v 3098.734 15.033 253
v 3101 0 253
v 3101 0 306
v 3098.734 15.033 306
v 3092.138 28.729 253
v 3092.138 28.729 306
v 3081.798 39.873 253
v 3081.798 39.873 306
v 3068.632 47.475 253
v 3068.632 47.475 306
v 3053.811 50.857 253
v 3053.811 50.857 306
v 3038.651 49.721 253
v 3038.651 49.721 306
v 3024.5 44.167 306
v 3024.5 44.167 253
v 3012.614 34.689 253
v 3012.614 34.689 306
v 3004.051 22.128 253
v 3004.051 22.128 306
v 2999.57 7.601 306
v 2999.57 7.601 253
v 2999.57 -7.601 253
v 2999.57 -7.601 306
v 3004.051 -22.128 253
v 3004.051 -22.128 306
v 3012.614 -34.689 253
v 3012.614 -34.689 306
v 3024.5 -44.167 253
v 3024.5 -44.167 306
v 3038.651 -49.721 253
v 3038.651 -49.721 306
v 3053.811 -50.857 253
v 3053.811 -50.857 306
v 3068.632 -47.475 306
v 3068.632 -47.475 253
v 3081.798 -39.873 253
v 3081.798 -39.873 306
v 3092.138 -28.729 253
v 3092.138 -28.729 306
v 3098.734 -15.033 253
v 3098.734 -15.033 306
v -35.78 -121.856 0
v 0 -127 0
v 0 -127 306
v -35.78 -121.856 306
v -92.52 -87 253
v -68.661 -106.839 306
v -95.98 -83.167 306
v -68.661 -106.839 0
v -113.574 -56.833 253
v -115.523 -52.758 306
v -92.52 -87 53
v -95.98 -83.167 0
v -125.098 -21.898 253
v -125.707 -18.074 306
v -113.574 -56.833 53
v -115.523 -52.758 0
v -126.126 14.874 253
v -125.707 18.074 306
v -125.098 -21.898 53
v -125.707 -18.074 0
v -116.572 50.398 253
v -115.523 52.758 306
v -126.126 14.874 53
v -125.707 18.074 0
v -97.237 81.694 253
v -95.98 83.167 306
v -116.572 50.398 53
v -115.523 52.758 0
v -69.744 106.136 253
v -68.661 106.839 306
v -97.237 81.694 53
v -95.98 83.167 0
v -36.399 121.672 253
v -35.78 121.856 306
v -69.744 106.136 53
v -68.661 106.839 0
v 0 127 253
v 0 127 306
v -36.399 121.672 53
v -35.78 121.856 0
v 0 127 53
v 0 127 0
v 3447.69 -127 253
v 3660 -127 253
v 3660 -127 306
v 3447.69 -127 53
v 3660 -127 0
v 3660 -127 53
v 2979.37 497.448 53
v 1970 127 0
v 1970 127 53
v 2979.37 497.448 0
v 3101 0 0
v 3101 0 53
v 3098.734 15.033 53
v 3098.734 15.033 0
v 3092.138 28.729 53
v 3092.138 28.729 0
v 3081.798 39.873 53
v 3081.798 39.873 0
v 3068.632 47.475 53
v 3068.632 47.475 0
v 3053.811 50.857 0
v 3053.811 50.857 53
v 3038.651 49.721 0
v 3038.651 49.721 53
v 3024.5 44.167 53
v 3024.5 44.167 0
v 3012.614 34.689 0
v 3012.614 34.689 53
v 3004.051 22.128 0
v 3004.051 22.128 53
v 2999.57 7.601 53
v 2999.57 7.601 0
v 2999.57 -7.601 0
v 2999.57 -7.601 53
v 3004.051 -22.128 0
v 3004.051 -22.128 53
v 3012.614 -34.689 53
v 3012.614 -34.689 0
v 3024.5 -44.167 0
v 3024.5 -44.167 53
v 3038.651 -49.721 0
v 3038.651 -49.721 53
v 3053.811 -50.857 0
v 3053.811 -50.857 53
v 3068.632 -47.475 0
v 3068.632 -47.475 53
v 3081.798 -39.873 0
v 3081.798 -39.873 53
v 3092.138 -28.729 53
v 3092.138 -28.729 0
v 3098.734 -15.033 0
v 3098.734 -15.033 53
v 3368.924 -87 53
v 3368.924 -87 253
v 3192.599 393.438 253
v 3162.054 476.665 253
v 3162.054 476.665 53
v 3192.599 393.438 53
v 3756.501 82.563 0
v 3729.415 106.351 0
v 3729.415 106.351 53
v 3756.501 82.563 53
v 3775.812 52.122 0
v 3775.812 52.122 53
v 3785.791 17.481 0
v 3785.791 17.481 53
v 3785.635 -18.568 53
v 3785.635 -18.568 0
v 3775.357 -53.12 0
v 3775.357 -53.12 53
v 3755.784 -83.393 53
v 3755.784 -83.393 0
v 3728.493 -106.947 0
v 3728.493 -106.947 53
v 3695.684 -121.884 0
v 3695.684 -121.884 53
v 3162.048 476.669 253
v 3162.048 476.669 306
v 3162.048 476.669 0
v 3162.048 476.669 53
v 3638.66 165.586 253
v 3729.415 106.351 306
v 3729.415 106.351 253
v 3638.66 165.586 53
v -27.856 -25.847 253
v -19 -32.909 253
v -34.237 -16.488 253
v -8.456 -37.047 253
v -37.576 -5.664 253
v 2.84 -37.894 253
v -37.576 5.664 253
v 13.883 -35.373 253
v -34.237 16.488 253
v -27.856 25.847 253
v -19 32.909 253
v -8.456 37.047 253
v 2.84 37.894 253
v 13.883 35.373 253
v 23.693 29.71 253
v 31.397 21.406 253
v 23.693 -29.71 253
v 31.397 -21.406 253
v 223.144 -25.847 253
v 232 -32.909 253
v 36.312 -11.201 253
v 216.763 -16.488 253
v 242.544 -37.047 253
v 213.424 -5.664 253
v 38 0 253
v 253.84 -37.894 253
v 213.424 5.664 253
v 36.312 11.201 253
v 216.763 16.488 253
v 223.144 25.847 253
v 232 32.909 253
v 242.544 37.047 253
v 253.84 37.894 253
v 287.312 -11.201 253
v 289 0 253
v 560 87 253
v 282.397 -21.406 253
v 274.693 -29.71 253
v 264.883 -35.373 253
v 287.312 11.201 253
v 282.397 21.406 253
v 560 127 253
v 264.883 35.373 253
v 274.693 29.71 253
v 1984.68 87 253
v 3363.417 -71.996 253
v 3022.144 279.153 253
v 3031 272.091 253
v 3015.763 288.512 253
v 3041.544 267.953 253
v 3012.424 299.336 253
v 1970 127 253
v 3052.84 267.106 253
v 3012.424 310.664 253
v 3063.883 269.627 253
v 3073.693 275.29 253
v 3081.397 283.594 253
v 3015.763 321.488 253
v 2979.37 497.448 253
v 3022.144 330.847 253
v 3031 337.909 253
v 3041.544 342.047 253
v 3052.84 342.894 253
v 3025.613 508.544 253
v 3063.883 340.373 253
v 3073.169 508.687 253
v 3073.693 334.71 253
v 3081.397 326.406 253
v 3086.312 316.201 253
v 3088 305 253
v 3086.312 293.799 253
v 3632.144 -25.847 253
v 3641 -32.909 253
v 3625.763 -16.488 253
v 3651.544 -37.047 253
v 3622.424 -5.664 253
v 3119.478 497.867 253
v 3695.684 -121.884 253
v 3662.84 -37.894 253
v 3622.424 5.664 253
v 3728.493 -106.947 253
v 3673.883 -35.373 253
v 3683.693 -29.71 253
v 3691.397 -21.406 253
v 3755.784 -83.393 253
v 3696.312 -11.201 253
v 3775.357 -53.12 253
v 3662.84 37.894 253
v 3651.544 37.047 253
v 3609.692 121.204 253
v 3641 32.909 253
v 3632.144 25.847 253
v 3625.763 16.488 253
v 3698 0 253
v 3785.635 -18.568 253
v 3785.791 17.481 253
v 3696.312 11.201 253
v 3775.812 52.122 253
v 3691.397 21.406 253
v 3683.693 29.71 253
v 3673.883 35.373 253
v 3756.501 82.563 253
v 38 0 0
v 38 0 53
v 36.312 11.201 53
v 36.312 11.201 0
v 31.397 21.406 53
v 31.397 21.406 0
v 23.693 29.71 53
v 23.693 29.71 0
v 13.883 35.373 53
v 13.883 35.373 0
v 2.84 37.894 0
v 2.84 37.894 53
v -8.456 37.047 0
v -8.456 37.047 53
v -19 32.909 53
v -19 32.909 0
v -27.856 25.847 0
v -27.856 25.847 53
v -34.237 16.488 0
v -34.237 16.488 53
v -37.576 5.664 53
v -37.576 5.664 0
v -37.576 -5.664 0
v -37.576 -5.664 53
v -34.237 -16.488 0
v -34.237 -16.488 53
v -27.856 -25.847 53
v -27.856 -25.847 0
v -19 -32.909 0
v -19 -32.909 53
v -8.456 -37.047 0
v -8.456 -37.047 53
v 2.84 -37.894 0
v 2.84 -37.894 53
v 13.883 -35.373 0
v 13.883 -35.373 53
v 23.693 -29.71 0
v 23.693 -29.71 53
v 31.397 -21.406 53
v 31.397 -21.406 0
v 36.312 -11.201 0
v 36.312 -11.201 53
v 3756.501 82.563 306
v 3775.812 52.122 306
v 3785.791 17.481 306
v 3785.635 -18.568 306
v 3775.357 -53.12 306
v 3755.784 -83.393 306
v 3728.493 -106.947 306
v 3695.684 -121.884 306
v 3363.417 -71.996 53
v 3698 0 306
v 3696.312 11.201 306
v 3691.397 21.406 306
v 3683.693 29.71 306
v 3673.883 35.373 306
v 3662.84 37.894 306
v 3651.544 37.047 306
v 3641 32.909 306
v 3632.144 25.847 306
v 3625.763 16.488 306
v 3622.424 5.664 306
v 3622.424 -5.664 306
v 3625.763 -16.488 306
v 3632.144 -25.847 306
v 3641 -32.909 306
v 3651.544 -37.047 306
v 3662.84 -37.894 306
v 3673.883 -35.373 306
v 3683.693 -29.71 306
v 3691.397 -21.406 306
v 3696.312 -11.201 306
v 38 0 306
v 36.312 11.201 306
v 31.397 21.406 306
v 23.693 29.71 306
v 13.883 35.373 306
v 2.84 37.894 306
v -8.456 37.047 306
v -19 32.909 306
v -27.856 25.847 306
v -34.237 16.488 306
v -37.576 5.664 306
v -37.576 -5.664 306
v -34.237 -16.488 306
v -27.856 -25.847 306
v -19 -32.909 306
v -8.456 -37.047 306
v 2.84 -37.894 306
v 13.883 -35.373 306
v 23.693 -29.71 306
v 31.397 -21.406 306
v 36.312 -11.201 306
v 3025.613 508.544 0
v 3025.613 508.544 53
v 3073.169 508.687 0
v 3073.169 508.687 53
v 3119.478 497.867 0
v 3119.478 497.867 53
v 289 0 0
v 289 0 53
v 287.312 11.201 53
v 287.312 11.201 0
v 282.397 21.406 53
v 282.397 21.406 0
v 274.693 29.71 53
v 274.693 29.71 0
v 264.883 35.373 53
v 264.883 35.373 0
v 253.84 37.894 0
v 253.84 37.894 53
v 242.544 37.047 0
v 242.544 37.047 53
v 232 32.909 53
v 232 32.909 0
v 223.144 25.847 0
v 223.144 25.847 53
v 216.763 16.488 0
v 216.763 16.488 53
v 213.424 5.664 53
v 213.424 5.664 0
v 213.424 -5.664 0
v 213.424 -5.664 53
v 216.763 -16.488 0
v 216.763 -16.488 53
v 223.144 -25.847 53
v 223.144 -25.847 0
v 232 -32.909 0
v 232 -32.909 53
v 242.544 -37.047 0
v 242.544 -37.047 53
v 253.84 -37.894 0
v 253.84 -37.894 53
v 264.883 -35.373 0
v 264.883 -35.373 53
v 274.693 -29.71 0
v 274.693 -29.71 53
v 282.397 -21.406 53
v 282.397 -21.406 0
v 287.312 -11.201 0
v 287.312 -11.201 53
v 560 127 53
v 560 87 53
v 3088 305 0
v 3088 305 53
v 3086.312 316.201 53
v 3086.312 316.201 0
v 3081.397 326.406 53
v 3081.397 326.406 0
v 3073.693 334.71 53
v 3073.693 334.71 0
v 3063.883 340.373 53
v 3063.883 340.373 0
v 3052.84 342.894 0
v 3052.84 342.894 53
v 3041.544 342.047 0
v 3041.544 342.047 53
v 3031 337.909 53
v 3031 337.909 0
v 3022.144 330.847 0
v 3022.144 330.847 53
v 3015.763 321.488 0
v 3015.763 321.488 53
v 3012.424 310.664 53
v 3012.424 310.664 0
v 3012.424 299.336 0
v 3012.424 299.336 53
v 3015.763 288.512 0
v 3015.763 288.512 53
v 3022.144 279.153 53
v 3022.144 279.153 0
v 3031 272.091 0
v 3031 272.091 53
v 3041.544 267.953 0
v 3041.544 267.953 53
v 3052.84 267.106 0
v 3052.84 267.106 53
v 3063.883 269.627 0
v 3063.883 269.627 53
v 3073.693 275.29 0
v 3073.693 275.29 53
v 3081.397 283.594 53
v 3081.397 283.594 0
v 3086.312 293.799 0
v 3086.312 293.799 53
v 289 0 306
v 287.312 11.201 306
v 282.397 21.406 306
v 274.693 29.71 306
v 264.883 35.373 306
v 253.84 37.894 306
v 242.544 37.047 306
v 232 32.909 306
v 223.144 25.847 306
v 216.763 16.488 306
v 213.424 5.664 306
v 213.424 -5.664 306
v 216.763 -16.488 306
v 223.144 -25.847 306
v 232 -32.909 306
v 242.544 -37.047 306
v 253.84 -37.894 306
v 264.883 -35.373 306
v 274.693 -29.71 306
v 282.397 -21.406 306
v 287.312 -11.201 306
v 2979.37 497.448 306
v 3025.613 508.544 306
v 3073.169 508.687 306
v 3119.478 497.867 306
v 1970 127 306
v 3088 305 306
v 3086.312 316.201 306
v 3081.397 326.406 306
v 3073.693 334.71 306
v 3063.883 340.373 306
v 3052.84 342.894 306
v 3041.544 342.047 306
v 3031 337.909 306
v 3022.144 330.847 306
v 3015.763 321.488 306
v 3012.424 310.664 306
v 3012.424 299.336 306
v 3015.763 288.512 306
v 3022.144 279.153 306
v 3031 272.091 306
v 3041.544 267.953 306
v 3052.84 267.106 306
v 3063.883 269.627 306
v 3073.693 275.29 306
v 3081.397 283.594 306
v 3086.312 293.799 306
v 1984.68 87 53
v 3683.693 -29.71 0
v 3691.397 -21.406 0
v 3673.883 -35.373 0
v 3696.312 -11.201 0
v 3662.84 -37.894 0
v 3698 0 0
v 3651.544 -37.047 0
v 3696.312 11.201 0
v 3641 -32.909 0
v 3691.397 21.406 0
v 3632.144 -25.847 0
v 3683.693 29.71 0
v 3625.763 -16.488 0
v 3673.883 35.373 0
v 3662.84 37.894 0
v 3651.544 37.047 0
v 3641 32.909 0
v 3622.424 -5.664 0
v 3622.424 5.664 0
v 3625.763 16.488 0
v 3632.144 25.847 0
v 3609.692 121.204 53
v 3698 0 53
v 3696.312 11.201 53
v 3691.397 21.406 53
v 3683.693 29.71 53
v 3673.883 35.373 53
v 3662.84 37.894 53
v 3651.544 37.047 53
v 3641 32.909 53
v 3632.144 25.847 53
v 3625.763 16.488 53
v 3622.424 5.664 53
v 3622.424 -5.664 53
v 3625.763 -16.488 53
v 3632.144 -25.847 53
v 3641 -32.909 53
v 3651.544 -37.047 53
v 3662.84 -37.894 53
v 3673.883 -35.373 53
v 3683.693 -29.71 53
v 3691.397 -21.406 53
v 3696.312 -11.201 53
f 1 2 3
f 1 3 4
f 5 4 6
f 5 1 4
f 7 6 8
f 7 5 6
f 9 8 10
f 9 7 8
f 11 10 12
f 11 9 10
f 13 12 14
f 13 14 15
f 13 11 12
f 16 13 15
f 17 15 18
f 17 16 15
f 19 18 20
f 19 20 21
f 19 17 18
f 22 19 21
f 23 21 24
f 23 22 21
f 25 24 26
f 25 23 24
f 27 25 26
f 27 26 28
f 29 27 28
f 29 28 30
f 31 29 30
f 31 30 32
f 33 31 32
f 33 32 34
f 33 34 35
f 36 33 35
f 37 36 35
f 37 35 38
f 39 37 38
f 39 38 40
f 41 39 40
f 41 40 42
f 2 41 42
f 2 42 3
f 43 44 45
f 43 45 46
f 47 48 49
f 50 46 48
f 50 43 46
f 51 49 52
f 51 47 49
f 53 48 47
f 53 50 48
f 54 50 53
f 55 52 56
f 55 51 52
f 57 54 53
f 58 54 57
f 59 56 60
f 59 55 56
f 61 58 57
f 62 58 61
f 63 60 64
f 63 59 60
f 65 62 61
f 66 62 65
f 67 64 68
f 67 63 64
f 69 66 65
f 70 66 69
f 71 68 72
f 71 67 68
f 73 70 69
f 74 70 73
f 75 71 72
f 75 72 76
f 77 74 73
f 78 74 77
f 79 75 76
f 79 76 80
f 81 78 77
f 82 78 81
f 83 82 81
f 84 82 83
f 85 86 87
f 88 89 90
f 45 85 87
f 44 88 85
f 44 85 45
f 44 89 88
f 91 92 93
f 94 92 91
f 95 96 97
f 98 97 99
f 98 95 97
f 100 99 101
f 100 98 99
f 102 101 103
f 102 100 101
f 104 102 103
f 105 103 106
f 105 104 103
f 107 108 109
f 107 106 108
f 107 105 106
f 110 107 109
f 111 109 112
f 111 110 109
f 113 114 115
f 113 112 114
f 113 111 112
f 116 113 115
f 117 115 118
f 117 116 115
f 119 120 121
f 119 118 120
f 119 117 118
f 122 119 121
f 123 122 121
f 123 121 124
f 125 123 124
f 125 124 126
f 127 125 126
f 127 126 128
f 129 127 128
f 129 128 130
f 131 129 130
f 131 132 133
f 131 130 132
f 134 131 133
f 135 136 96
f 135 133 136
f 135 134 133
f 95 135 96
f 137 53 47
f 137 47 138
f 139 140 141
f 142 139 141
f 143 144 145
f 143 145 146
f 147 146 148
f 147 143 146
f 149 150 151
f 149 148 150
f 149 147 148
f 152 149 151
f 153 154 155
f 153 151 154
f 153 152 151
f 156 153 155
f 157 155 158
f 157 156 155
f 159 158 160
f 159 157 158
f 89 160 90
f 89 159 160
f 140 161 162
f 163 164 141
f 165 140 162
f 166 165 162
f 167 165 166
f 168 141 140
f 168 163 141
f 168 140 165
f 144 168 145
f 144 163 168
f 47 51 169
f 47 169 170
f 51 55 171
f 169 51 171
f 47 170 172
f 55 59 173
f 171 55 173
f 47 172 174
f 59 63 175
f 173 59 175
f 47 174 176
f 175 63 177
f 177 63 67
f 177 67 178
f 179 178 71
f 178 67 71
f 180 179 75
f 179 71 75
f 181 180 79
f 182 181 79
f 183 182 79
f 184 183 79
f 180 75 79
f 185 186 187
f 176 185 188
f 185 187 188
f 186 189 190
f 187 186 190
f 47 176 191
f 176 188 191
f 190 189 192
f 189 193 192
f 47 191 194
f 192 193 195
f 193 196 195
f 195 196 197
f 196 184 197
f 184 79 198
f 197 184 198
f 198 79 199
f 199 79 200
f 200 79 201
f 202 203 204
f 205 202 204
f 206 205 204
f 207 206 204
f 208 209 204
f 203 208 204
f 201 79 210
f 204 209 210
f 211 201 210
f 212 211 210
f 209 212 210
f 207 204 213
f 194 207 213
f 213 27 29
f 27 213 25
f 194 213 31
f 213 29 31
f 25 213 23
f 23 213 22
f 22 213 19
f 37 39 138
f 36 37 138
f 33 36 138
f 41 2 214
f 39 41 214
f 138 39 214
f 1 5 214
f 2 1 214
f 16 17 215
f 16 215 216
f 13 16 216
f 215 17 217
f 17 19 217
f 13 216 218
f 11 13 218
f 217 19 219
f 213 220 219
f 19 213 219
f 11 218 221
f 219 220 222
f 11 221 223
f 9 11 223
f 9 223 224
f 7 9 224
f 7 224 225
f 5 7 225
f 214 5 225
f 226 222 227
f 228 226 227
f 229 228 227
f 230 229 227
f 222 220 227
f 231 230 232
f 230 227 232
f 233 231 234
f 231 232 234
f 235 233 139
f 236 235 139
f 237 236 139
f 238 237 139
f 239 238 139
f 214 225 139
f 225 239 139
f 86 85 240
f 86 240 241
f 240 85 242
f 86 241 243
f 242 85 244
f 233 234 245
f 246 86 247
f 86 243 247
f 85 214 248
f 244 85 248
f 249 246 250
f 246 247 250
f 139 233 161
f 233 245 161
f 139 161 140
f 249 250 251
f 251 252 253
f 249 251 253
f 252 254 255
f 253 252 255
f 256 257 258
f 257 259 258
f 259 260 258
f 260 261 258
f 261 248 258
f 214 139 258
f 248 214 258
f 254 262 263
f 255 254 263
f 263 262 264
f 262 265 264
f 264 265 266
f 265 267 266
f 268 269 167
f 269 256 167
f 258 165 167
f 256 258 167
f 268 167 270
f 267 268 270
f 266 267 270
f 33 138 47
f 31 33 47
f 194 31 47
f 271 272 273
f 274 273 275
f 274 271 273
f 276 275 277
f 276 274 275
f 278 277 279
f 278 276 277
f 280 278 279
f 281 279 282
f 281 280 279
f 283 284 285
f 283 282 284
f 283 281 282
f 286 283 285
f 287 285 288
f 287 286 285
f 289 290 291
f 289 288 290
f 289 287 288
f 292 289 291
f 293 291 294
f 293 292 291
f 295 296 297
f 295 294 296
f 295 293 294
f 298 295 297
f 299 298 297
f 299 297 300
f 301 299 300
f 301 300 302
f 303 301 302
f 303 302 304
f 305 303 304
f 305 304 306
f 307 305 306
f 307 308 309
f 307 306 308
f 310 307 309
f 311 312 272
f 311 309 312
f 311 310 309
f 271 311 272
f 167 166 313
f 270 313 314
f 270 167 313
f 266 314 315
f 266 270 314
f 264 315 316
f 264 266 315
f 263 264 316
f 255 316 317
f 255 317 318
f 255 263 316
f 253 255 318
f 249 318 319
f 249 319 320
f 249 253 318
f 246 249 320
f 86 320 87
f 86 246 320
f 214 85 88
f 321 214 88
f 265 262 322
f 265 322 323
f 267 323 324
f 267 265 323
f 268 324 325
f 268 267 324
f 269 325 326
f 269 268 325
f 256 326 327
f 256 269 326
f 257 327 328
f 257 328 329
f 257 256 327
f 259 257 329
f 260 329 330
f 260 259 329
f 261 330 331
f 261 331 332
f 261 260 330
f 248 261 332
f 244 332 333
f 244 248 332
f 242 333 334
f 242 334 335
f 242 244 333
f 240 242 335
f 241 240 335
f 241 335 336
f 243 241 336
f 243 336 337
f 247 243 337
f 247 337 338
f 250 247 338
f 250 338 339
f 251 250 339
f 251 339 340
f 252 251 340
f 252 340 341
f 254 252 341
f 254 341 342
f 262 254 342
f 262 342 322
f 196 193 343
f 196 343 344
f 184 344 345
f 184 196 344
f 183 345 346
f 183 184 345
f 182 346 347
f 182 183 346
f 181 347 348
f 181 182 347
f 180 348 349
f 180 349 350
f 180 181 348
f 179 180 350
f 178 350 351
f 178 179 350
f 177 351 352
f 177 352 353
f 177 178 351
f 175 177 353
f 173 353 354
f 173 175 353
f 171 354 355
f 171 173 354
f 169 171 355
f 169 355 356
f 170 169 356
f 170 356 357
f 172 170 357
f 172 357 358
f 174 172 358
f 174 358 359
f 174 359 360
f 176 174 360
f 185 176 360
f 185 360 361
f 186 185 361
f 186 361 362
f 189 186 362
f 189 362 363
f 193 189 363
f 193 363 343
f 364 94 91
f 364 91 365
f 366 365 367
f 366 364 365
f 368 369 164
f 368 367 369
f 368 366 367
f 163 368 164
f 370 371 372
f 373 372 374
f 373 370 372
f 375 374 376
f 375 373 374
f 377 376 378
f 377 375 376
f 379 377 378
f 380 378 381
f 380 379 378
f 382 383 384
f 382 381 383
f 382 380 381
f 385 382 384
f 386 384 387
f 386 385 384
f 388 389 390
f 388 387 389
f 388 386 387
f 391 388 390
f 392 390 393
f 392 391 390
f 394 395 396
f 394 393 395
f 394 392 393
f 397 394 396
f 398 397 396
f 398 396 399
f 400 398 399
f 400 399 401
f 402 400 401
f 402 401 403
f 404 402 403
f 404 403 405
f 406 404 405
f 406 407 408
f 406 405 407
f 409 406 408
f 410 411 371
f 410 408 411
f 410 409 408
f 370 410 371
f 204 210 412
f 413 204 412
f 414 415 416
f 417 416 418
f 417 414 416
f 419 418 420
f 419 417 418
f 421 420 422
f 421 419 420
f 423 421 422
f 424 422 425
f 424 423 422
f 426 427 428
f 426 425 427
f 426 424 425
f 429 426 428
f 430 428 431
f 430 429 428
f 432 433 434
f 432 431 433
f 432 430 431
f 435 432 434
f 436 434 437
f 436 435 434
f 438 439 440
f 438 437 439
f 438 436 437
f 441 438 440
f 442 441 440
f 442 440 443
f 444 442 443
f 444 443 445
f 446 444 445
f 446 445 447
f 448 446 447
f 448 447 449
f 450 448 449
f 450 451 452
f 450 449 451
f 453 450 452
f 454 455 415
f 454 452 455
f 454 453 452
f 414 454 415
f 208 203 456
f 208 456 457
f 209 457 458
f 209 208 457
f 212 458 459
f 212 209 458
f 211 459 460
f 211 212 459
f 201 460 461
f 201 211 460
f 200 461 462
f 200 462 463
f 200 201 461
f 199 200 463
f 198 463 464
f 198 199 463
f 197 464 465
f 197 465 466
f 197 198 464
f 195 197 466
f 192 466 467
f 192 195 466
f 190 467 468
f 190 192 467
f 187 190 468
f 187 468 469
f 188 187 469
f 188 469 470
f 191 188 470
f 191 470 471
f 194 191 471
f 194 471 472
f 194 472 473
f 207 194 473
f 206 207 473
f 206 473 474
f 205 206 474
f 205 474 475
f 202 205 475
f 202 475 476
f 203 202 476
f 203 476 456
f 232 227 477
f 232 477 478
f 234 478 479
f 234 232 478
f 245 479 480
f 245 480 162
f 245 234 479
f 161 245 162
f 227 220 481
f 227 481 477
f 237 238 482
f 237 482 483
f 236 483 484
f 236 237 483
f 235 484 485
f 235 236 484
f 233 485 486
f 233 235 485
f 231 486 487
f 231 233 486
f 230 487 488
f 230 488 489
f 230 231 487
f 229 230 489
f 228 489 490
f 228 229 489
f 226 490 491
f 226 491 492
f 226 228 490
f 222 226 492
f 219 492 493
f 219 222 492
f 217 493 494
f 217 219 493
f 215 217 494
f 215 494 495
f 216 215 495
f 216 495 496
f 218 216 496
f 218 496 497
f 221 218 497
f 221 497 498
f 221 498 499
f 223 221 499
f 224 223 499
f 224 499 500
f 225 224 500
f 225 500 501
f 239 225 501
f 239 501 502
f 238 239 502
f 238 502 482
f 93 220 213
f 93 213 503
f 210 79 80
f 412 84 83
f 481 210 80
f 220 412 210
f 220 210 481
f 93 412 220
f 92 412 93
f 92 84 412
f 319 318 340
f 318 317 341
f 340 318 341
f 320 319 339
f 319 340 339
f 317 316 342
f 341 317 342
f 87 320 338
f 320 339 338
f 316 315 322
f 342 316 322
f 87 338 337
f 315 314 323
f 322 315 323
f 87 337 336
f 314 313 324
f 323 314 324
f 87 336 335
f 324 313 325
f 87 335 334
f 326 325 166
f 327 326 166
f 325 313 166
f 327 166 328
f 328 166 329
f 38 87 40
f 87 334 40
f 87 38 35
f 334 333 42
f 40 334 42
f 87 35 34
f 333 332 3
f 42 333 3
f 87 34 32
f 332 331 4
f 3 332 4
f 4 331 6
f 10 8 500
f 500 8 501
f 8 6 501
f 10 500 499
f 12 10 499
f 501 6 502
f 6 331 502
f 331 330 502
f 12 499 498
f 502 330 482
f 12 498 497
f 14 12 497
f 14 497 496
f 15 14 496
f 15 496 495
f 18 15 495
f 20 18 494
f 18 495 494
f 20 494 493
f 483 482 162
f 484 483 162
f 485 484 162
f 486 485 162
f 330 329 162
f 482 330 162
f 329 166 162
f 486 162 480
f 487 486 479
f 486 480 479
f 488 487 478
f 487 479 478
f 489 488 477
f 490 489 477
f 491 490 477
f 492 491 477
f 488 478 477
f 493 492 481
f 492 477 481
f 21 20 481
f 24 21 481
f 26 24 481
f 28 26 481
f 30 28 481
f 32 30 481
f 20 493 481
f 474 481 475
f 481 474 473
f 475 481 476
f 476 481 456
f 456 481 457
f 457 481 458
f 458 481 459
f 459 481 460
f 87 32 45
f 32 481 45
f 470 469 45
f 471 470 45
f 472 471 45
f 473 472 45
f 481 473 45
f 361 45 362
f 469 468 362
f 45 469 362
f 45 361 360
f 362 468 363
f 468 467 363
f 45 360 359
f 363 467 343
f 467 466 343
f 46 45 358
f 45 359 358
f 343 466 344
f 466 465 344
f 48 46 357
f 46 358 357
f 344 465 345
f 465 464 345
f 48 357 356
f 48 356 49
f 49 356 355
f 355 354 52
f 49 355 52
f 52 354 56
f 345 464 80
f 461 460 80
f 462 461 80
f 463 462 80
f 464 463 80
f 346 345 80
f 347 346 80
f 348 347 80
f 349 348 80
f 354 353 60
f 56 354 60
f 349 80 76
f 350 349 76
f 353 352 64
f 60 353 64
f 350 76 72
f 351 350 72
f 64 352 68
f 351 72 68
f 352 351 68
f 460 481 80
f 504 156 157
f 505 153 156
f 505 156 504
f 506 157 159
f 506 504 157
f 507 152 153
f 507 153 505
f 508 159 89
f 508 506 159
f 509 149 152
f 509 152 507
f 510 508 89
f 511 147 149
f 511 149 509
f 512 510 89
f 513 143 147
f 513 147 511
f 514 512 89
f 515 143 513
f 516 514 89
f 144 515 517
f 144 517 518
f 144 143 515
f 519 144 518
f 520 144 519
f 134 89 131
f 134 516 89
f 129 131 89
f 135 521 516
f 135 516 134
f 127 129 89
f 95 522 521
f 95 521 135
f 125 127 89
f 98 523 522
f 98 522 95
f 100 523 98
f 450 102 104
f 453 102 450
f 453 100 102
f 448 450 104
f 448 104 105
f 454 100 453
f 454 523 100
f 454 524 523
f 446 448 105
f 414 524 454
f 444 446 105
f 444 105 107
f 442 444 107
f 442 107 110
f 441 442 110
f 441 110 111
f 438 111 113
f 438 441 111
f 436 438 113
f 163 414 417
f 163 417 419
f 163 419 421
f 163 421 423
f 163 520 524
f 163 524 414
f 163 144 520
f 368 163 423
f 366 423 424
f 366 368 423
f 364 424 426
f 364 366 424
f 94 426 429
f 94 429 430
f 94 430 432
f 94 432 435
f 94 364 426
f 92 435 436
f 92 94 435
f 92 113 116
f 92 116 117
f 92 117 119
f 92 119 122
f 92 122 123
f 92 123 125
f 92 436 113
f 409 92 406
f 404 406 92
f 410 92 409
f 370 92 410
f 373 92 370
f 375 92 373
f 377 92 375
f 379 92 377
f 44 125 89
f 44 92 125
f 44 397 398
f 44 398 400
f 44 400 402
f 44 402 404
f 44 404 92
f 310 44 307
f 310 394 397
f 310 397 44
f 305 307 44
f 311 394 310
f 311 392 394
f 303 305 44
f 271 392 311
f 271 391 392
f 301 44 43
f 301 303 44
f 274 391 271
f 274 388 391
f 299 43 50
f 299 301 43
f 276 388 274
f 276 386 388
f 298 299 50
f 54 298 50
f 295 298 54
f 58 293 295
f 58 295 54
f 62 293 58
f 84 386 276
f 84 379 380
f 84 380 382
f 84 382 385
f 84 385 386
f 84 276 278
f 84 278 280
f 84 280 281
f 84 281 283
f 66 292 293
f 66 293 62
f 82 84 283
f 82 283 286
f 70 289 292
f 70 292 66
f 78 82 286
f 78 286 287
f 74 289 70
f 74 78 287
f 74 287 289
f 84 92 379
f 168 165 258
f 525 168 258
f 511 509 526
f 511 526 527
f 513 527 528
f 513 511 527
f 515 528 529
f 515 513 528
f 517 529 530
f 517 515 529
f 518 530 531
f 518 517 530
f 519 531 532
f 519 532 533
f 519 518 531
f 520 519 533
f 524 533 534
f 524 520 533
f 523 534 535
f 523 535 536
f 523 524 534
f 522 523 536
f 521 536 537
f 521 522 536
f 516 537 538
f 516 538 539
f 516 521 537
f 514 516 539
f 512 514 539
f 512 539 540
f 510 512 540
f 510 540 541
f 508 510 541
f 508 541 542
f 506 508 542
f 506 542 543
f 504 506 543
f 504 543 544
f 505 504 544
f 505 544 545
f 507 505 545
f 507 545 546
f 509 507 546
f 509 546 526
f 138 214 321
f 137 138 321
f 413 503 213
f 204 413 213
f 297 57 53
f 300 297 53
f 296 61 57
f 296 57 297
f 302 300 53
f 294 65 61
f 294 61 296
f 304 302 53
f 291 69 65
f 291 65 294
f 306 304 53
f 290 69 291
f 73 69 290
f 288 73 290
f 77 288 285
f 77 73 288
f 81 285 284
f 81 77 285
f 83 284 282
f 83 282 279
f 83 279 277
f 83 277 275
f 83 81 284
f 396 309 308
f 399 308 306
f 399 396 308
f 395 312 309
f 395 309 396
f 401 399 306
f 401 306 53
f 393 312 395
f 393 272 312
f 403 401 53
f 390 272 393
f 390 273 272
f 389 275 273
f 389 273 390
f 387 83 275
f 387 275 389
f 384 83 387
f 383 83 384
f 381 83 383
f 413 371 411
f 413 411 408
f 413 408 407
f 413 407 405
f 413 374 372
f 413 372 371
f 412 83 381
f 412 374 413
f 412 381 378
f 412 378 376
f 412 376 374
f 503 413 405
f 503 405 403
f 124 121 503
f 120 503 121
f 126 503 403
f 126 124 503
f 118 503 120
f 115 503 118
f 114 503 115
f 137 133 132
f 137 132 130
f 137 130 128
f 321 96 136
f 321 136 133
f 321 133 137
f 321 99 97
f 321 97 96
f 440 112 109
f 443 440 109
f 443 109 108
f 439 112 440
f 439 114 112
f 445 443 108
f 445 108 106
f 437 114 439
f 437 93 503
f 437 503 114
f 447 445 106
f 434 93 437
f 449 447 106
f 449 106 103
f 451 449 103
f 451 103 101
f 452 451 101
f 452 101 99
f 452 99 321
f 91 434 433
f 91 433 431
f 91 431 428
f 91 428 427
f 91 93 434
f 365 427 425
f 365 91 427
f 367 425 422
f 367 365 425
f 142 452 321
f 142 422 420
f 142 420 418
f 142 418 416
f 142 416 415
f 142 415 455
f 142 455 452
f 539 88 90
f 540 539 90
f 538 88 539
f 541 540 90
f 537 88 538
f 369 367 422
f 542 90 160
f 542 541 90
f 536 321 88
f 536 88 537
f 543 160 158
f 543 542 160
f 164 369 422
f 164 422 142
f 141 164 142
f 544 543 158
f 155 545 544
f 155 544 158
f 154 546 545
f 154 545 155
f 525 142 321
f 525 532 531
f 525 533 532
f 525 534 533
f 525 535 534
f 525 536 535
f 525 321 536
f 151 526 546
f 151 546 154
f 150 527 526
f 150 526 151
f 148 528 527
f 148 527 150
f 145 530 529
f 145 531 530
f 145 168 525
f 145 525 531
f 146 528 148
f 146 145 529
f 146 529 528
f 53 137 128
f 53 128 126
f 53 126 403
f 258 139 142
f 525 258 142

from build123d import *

# Parameters (mm, degrees)
SKETCH1_R           = 38
SKETCH1_R_2         = 51
BOSS_EXTRUDE1_DEPTH = 306
SKETCH2_W           = 687
SKETCH2_H           = 200
CUT_EXTRUDE1_DEPTH  = 214
CUT_EXTRUDE2_START  = -53
SKETCH3_R           = 38
CUT_EXTRUDE2_DEPTH  = 200
SKETCH4_W           = 200
SKETCH4_H           = 174
CUT_EXTRUDE3_DEPTH  = 2690
CUT_EXTRUDE4_REACH  = 866.474
SKETCH5_W           = 1239.54
SKETCH5_H           = 200
SKETCH6_W           = 200
SKETCH6_H           = 296.394261921
CUT_EXTRUDE5_DEPTH  = 2690


with BuildPart() as part:
    # Sketch1 → Boss-Extrude1 (new body)
    with BuildSketch(Plane.XY):
        with BuildLine():
            Line((0, 127), (1970, 127))
            Line((1970, 127), (2979.369630846, 497.448307224))
            ThreePointArc((2979.369630846, 497.448307224), (3073.168771089, 508.686543606), (3162.047709692, 476.669189876))
            Line((3162.047709692, 476.669189876), (3729.41492259, 106.351156655))
            ThreePointArc((3729.41492259, 106.351156655), (3781.728379795, -36.210517152), (3660, -127))
            Line((3660, -127), (0, -127))
            ThreePointArc((0, -127), (-127, 0), (0, 127))
        make_face()
        Circle(SKETCH1_R, mode=Mode.SUBTRACT)
        with Locations((3660, 0)):
            Circle(SKETCH1_R, mode=Mode.SUBTRACT)
        with Locations((3050, 0)):
            Circle(SKETCH1_R_2, mode=Mode.SUBTRACT)
        with Locations((3050, 305)):
            Circle(SKETCH1_R, mode=Mode.SUBTRACT)
        with Locations((251, 0)):
            Circle(SKETCH1_R, mode=Mode.SUBTRACT)
    extrude(amount=BOSS_EXTRUDE1_DEPTH)

    # Sketch2 → Cut-Extrude1 (cut)
    with BuildSketch(Plane(origin=(0, 127, 0), x_dir=(1, 0, 0), z_dir=(0, 1, 0))):
        with Locations((216.5, -153)):
            Rectangle(SKETCH2_W, SKETCH2_H)
    extrude(amount=-CUT_EXTRUDE1_DEPTH, mode=Mode.SUBTRACT)

    # Sketch3 → Cut-Extrude2 (cut)
    with BuildSketch(Plane.XY.offset(306).offset(CUT_EXTRUDE2_START)):
        with BuildLine():
            Line((3729.41492259, 106.351156655), (3638.66, 165.586487274))
            Line((3638.66, 165.586487274), (3447.690113035, -127))
            Line((3447.690113035, -127), (3660, -127))
            ThreePointArc((3660, -127), (3781.728379795, -36.210517152), (3729.41492259, 106.351156655))
        make_face()
        with Locations((3660, 0)):
            Circle(SKETCH3_R, mode=Mode.SUBTRACT)
    extrude(amount=-CUT_EXTRUDE2_DEPTH, mode=Mode.SUBTRACT)

    # Sketch4 → Cut-Extrude3 (cut)
    with BuildSketch(Plane.ZY.offset(-560)):
        with Locations((153, 0)):
            Rectangle(SKETCH4_W, SKETCH4_H)
    extrude(amount=-CUT_EXTRUDE3_DEPTH, mode=Mode.SUBTRACT)

    # Cut-Extrude4: up to this face of the body (flat: up to its plane)
    cut_extrude4_end = Plane(part.part.faces().sort_by_distance((1578.739865975, -87, 153))[0])
    # Sketch5 → Cut-Extrude4 (cut, up to the picked face)
    with BuildSketch(Plane(origin=(192.774928242, -525.258597117, 0), x_dir=(0.93877223, 0.344538386, 0), z_dir=(-0.344538386, 0.93877223, 0)), mode=Mode.PRIVATE) as cut_extrude4_sk1:
        with Locations((2512.907668844, -153)):
            Rectangle(SKETCH5_W, SKETCH5_H)
    cut_extrude4_tool1 = split(extrude(cut_extrude4_sk1.sketch, amount=-CUT_EXTRUDE4_REACH, mode=Mode.PRIVATE), bisect_by=cut_extrude4_end, keep=Keep.BOTH, mode=Mode.PRIVATE)
    add(cut_extrude4_tool1.solids().sort_by_distance((2551.822865, 340.534556, 153))[0], mode=Mode.SUBTRACT)

    # Sketch6 → Cut-Extrude5 (cut)
    with BuildSketch(Plane(origin=(2475.844419588, -1615.972539797, 0), x_dir=(0, 0, -1), z_dir=(0.837410682, -0.546574194, 0))):
        with Locations((-153, 1926.264417691)):
            Rectangle(SKETCH6_W, SKETCH6_H)
    extrude(amount=-CUT_EXTRUDE5_DEPTH, mode=Mode.SUBTRACT)


solid = part.part
